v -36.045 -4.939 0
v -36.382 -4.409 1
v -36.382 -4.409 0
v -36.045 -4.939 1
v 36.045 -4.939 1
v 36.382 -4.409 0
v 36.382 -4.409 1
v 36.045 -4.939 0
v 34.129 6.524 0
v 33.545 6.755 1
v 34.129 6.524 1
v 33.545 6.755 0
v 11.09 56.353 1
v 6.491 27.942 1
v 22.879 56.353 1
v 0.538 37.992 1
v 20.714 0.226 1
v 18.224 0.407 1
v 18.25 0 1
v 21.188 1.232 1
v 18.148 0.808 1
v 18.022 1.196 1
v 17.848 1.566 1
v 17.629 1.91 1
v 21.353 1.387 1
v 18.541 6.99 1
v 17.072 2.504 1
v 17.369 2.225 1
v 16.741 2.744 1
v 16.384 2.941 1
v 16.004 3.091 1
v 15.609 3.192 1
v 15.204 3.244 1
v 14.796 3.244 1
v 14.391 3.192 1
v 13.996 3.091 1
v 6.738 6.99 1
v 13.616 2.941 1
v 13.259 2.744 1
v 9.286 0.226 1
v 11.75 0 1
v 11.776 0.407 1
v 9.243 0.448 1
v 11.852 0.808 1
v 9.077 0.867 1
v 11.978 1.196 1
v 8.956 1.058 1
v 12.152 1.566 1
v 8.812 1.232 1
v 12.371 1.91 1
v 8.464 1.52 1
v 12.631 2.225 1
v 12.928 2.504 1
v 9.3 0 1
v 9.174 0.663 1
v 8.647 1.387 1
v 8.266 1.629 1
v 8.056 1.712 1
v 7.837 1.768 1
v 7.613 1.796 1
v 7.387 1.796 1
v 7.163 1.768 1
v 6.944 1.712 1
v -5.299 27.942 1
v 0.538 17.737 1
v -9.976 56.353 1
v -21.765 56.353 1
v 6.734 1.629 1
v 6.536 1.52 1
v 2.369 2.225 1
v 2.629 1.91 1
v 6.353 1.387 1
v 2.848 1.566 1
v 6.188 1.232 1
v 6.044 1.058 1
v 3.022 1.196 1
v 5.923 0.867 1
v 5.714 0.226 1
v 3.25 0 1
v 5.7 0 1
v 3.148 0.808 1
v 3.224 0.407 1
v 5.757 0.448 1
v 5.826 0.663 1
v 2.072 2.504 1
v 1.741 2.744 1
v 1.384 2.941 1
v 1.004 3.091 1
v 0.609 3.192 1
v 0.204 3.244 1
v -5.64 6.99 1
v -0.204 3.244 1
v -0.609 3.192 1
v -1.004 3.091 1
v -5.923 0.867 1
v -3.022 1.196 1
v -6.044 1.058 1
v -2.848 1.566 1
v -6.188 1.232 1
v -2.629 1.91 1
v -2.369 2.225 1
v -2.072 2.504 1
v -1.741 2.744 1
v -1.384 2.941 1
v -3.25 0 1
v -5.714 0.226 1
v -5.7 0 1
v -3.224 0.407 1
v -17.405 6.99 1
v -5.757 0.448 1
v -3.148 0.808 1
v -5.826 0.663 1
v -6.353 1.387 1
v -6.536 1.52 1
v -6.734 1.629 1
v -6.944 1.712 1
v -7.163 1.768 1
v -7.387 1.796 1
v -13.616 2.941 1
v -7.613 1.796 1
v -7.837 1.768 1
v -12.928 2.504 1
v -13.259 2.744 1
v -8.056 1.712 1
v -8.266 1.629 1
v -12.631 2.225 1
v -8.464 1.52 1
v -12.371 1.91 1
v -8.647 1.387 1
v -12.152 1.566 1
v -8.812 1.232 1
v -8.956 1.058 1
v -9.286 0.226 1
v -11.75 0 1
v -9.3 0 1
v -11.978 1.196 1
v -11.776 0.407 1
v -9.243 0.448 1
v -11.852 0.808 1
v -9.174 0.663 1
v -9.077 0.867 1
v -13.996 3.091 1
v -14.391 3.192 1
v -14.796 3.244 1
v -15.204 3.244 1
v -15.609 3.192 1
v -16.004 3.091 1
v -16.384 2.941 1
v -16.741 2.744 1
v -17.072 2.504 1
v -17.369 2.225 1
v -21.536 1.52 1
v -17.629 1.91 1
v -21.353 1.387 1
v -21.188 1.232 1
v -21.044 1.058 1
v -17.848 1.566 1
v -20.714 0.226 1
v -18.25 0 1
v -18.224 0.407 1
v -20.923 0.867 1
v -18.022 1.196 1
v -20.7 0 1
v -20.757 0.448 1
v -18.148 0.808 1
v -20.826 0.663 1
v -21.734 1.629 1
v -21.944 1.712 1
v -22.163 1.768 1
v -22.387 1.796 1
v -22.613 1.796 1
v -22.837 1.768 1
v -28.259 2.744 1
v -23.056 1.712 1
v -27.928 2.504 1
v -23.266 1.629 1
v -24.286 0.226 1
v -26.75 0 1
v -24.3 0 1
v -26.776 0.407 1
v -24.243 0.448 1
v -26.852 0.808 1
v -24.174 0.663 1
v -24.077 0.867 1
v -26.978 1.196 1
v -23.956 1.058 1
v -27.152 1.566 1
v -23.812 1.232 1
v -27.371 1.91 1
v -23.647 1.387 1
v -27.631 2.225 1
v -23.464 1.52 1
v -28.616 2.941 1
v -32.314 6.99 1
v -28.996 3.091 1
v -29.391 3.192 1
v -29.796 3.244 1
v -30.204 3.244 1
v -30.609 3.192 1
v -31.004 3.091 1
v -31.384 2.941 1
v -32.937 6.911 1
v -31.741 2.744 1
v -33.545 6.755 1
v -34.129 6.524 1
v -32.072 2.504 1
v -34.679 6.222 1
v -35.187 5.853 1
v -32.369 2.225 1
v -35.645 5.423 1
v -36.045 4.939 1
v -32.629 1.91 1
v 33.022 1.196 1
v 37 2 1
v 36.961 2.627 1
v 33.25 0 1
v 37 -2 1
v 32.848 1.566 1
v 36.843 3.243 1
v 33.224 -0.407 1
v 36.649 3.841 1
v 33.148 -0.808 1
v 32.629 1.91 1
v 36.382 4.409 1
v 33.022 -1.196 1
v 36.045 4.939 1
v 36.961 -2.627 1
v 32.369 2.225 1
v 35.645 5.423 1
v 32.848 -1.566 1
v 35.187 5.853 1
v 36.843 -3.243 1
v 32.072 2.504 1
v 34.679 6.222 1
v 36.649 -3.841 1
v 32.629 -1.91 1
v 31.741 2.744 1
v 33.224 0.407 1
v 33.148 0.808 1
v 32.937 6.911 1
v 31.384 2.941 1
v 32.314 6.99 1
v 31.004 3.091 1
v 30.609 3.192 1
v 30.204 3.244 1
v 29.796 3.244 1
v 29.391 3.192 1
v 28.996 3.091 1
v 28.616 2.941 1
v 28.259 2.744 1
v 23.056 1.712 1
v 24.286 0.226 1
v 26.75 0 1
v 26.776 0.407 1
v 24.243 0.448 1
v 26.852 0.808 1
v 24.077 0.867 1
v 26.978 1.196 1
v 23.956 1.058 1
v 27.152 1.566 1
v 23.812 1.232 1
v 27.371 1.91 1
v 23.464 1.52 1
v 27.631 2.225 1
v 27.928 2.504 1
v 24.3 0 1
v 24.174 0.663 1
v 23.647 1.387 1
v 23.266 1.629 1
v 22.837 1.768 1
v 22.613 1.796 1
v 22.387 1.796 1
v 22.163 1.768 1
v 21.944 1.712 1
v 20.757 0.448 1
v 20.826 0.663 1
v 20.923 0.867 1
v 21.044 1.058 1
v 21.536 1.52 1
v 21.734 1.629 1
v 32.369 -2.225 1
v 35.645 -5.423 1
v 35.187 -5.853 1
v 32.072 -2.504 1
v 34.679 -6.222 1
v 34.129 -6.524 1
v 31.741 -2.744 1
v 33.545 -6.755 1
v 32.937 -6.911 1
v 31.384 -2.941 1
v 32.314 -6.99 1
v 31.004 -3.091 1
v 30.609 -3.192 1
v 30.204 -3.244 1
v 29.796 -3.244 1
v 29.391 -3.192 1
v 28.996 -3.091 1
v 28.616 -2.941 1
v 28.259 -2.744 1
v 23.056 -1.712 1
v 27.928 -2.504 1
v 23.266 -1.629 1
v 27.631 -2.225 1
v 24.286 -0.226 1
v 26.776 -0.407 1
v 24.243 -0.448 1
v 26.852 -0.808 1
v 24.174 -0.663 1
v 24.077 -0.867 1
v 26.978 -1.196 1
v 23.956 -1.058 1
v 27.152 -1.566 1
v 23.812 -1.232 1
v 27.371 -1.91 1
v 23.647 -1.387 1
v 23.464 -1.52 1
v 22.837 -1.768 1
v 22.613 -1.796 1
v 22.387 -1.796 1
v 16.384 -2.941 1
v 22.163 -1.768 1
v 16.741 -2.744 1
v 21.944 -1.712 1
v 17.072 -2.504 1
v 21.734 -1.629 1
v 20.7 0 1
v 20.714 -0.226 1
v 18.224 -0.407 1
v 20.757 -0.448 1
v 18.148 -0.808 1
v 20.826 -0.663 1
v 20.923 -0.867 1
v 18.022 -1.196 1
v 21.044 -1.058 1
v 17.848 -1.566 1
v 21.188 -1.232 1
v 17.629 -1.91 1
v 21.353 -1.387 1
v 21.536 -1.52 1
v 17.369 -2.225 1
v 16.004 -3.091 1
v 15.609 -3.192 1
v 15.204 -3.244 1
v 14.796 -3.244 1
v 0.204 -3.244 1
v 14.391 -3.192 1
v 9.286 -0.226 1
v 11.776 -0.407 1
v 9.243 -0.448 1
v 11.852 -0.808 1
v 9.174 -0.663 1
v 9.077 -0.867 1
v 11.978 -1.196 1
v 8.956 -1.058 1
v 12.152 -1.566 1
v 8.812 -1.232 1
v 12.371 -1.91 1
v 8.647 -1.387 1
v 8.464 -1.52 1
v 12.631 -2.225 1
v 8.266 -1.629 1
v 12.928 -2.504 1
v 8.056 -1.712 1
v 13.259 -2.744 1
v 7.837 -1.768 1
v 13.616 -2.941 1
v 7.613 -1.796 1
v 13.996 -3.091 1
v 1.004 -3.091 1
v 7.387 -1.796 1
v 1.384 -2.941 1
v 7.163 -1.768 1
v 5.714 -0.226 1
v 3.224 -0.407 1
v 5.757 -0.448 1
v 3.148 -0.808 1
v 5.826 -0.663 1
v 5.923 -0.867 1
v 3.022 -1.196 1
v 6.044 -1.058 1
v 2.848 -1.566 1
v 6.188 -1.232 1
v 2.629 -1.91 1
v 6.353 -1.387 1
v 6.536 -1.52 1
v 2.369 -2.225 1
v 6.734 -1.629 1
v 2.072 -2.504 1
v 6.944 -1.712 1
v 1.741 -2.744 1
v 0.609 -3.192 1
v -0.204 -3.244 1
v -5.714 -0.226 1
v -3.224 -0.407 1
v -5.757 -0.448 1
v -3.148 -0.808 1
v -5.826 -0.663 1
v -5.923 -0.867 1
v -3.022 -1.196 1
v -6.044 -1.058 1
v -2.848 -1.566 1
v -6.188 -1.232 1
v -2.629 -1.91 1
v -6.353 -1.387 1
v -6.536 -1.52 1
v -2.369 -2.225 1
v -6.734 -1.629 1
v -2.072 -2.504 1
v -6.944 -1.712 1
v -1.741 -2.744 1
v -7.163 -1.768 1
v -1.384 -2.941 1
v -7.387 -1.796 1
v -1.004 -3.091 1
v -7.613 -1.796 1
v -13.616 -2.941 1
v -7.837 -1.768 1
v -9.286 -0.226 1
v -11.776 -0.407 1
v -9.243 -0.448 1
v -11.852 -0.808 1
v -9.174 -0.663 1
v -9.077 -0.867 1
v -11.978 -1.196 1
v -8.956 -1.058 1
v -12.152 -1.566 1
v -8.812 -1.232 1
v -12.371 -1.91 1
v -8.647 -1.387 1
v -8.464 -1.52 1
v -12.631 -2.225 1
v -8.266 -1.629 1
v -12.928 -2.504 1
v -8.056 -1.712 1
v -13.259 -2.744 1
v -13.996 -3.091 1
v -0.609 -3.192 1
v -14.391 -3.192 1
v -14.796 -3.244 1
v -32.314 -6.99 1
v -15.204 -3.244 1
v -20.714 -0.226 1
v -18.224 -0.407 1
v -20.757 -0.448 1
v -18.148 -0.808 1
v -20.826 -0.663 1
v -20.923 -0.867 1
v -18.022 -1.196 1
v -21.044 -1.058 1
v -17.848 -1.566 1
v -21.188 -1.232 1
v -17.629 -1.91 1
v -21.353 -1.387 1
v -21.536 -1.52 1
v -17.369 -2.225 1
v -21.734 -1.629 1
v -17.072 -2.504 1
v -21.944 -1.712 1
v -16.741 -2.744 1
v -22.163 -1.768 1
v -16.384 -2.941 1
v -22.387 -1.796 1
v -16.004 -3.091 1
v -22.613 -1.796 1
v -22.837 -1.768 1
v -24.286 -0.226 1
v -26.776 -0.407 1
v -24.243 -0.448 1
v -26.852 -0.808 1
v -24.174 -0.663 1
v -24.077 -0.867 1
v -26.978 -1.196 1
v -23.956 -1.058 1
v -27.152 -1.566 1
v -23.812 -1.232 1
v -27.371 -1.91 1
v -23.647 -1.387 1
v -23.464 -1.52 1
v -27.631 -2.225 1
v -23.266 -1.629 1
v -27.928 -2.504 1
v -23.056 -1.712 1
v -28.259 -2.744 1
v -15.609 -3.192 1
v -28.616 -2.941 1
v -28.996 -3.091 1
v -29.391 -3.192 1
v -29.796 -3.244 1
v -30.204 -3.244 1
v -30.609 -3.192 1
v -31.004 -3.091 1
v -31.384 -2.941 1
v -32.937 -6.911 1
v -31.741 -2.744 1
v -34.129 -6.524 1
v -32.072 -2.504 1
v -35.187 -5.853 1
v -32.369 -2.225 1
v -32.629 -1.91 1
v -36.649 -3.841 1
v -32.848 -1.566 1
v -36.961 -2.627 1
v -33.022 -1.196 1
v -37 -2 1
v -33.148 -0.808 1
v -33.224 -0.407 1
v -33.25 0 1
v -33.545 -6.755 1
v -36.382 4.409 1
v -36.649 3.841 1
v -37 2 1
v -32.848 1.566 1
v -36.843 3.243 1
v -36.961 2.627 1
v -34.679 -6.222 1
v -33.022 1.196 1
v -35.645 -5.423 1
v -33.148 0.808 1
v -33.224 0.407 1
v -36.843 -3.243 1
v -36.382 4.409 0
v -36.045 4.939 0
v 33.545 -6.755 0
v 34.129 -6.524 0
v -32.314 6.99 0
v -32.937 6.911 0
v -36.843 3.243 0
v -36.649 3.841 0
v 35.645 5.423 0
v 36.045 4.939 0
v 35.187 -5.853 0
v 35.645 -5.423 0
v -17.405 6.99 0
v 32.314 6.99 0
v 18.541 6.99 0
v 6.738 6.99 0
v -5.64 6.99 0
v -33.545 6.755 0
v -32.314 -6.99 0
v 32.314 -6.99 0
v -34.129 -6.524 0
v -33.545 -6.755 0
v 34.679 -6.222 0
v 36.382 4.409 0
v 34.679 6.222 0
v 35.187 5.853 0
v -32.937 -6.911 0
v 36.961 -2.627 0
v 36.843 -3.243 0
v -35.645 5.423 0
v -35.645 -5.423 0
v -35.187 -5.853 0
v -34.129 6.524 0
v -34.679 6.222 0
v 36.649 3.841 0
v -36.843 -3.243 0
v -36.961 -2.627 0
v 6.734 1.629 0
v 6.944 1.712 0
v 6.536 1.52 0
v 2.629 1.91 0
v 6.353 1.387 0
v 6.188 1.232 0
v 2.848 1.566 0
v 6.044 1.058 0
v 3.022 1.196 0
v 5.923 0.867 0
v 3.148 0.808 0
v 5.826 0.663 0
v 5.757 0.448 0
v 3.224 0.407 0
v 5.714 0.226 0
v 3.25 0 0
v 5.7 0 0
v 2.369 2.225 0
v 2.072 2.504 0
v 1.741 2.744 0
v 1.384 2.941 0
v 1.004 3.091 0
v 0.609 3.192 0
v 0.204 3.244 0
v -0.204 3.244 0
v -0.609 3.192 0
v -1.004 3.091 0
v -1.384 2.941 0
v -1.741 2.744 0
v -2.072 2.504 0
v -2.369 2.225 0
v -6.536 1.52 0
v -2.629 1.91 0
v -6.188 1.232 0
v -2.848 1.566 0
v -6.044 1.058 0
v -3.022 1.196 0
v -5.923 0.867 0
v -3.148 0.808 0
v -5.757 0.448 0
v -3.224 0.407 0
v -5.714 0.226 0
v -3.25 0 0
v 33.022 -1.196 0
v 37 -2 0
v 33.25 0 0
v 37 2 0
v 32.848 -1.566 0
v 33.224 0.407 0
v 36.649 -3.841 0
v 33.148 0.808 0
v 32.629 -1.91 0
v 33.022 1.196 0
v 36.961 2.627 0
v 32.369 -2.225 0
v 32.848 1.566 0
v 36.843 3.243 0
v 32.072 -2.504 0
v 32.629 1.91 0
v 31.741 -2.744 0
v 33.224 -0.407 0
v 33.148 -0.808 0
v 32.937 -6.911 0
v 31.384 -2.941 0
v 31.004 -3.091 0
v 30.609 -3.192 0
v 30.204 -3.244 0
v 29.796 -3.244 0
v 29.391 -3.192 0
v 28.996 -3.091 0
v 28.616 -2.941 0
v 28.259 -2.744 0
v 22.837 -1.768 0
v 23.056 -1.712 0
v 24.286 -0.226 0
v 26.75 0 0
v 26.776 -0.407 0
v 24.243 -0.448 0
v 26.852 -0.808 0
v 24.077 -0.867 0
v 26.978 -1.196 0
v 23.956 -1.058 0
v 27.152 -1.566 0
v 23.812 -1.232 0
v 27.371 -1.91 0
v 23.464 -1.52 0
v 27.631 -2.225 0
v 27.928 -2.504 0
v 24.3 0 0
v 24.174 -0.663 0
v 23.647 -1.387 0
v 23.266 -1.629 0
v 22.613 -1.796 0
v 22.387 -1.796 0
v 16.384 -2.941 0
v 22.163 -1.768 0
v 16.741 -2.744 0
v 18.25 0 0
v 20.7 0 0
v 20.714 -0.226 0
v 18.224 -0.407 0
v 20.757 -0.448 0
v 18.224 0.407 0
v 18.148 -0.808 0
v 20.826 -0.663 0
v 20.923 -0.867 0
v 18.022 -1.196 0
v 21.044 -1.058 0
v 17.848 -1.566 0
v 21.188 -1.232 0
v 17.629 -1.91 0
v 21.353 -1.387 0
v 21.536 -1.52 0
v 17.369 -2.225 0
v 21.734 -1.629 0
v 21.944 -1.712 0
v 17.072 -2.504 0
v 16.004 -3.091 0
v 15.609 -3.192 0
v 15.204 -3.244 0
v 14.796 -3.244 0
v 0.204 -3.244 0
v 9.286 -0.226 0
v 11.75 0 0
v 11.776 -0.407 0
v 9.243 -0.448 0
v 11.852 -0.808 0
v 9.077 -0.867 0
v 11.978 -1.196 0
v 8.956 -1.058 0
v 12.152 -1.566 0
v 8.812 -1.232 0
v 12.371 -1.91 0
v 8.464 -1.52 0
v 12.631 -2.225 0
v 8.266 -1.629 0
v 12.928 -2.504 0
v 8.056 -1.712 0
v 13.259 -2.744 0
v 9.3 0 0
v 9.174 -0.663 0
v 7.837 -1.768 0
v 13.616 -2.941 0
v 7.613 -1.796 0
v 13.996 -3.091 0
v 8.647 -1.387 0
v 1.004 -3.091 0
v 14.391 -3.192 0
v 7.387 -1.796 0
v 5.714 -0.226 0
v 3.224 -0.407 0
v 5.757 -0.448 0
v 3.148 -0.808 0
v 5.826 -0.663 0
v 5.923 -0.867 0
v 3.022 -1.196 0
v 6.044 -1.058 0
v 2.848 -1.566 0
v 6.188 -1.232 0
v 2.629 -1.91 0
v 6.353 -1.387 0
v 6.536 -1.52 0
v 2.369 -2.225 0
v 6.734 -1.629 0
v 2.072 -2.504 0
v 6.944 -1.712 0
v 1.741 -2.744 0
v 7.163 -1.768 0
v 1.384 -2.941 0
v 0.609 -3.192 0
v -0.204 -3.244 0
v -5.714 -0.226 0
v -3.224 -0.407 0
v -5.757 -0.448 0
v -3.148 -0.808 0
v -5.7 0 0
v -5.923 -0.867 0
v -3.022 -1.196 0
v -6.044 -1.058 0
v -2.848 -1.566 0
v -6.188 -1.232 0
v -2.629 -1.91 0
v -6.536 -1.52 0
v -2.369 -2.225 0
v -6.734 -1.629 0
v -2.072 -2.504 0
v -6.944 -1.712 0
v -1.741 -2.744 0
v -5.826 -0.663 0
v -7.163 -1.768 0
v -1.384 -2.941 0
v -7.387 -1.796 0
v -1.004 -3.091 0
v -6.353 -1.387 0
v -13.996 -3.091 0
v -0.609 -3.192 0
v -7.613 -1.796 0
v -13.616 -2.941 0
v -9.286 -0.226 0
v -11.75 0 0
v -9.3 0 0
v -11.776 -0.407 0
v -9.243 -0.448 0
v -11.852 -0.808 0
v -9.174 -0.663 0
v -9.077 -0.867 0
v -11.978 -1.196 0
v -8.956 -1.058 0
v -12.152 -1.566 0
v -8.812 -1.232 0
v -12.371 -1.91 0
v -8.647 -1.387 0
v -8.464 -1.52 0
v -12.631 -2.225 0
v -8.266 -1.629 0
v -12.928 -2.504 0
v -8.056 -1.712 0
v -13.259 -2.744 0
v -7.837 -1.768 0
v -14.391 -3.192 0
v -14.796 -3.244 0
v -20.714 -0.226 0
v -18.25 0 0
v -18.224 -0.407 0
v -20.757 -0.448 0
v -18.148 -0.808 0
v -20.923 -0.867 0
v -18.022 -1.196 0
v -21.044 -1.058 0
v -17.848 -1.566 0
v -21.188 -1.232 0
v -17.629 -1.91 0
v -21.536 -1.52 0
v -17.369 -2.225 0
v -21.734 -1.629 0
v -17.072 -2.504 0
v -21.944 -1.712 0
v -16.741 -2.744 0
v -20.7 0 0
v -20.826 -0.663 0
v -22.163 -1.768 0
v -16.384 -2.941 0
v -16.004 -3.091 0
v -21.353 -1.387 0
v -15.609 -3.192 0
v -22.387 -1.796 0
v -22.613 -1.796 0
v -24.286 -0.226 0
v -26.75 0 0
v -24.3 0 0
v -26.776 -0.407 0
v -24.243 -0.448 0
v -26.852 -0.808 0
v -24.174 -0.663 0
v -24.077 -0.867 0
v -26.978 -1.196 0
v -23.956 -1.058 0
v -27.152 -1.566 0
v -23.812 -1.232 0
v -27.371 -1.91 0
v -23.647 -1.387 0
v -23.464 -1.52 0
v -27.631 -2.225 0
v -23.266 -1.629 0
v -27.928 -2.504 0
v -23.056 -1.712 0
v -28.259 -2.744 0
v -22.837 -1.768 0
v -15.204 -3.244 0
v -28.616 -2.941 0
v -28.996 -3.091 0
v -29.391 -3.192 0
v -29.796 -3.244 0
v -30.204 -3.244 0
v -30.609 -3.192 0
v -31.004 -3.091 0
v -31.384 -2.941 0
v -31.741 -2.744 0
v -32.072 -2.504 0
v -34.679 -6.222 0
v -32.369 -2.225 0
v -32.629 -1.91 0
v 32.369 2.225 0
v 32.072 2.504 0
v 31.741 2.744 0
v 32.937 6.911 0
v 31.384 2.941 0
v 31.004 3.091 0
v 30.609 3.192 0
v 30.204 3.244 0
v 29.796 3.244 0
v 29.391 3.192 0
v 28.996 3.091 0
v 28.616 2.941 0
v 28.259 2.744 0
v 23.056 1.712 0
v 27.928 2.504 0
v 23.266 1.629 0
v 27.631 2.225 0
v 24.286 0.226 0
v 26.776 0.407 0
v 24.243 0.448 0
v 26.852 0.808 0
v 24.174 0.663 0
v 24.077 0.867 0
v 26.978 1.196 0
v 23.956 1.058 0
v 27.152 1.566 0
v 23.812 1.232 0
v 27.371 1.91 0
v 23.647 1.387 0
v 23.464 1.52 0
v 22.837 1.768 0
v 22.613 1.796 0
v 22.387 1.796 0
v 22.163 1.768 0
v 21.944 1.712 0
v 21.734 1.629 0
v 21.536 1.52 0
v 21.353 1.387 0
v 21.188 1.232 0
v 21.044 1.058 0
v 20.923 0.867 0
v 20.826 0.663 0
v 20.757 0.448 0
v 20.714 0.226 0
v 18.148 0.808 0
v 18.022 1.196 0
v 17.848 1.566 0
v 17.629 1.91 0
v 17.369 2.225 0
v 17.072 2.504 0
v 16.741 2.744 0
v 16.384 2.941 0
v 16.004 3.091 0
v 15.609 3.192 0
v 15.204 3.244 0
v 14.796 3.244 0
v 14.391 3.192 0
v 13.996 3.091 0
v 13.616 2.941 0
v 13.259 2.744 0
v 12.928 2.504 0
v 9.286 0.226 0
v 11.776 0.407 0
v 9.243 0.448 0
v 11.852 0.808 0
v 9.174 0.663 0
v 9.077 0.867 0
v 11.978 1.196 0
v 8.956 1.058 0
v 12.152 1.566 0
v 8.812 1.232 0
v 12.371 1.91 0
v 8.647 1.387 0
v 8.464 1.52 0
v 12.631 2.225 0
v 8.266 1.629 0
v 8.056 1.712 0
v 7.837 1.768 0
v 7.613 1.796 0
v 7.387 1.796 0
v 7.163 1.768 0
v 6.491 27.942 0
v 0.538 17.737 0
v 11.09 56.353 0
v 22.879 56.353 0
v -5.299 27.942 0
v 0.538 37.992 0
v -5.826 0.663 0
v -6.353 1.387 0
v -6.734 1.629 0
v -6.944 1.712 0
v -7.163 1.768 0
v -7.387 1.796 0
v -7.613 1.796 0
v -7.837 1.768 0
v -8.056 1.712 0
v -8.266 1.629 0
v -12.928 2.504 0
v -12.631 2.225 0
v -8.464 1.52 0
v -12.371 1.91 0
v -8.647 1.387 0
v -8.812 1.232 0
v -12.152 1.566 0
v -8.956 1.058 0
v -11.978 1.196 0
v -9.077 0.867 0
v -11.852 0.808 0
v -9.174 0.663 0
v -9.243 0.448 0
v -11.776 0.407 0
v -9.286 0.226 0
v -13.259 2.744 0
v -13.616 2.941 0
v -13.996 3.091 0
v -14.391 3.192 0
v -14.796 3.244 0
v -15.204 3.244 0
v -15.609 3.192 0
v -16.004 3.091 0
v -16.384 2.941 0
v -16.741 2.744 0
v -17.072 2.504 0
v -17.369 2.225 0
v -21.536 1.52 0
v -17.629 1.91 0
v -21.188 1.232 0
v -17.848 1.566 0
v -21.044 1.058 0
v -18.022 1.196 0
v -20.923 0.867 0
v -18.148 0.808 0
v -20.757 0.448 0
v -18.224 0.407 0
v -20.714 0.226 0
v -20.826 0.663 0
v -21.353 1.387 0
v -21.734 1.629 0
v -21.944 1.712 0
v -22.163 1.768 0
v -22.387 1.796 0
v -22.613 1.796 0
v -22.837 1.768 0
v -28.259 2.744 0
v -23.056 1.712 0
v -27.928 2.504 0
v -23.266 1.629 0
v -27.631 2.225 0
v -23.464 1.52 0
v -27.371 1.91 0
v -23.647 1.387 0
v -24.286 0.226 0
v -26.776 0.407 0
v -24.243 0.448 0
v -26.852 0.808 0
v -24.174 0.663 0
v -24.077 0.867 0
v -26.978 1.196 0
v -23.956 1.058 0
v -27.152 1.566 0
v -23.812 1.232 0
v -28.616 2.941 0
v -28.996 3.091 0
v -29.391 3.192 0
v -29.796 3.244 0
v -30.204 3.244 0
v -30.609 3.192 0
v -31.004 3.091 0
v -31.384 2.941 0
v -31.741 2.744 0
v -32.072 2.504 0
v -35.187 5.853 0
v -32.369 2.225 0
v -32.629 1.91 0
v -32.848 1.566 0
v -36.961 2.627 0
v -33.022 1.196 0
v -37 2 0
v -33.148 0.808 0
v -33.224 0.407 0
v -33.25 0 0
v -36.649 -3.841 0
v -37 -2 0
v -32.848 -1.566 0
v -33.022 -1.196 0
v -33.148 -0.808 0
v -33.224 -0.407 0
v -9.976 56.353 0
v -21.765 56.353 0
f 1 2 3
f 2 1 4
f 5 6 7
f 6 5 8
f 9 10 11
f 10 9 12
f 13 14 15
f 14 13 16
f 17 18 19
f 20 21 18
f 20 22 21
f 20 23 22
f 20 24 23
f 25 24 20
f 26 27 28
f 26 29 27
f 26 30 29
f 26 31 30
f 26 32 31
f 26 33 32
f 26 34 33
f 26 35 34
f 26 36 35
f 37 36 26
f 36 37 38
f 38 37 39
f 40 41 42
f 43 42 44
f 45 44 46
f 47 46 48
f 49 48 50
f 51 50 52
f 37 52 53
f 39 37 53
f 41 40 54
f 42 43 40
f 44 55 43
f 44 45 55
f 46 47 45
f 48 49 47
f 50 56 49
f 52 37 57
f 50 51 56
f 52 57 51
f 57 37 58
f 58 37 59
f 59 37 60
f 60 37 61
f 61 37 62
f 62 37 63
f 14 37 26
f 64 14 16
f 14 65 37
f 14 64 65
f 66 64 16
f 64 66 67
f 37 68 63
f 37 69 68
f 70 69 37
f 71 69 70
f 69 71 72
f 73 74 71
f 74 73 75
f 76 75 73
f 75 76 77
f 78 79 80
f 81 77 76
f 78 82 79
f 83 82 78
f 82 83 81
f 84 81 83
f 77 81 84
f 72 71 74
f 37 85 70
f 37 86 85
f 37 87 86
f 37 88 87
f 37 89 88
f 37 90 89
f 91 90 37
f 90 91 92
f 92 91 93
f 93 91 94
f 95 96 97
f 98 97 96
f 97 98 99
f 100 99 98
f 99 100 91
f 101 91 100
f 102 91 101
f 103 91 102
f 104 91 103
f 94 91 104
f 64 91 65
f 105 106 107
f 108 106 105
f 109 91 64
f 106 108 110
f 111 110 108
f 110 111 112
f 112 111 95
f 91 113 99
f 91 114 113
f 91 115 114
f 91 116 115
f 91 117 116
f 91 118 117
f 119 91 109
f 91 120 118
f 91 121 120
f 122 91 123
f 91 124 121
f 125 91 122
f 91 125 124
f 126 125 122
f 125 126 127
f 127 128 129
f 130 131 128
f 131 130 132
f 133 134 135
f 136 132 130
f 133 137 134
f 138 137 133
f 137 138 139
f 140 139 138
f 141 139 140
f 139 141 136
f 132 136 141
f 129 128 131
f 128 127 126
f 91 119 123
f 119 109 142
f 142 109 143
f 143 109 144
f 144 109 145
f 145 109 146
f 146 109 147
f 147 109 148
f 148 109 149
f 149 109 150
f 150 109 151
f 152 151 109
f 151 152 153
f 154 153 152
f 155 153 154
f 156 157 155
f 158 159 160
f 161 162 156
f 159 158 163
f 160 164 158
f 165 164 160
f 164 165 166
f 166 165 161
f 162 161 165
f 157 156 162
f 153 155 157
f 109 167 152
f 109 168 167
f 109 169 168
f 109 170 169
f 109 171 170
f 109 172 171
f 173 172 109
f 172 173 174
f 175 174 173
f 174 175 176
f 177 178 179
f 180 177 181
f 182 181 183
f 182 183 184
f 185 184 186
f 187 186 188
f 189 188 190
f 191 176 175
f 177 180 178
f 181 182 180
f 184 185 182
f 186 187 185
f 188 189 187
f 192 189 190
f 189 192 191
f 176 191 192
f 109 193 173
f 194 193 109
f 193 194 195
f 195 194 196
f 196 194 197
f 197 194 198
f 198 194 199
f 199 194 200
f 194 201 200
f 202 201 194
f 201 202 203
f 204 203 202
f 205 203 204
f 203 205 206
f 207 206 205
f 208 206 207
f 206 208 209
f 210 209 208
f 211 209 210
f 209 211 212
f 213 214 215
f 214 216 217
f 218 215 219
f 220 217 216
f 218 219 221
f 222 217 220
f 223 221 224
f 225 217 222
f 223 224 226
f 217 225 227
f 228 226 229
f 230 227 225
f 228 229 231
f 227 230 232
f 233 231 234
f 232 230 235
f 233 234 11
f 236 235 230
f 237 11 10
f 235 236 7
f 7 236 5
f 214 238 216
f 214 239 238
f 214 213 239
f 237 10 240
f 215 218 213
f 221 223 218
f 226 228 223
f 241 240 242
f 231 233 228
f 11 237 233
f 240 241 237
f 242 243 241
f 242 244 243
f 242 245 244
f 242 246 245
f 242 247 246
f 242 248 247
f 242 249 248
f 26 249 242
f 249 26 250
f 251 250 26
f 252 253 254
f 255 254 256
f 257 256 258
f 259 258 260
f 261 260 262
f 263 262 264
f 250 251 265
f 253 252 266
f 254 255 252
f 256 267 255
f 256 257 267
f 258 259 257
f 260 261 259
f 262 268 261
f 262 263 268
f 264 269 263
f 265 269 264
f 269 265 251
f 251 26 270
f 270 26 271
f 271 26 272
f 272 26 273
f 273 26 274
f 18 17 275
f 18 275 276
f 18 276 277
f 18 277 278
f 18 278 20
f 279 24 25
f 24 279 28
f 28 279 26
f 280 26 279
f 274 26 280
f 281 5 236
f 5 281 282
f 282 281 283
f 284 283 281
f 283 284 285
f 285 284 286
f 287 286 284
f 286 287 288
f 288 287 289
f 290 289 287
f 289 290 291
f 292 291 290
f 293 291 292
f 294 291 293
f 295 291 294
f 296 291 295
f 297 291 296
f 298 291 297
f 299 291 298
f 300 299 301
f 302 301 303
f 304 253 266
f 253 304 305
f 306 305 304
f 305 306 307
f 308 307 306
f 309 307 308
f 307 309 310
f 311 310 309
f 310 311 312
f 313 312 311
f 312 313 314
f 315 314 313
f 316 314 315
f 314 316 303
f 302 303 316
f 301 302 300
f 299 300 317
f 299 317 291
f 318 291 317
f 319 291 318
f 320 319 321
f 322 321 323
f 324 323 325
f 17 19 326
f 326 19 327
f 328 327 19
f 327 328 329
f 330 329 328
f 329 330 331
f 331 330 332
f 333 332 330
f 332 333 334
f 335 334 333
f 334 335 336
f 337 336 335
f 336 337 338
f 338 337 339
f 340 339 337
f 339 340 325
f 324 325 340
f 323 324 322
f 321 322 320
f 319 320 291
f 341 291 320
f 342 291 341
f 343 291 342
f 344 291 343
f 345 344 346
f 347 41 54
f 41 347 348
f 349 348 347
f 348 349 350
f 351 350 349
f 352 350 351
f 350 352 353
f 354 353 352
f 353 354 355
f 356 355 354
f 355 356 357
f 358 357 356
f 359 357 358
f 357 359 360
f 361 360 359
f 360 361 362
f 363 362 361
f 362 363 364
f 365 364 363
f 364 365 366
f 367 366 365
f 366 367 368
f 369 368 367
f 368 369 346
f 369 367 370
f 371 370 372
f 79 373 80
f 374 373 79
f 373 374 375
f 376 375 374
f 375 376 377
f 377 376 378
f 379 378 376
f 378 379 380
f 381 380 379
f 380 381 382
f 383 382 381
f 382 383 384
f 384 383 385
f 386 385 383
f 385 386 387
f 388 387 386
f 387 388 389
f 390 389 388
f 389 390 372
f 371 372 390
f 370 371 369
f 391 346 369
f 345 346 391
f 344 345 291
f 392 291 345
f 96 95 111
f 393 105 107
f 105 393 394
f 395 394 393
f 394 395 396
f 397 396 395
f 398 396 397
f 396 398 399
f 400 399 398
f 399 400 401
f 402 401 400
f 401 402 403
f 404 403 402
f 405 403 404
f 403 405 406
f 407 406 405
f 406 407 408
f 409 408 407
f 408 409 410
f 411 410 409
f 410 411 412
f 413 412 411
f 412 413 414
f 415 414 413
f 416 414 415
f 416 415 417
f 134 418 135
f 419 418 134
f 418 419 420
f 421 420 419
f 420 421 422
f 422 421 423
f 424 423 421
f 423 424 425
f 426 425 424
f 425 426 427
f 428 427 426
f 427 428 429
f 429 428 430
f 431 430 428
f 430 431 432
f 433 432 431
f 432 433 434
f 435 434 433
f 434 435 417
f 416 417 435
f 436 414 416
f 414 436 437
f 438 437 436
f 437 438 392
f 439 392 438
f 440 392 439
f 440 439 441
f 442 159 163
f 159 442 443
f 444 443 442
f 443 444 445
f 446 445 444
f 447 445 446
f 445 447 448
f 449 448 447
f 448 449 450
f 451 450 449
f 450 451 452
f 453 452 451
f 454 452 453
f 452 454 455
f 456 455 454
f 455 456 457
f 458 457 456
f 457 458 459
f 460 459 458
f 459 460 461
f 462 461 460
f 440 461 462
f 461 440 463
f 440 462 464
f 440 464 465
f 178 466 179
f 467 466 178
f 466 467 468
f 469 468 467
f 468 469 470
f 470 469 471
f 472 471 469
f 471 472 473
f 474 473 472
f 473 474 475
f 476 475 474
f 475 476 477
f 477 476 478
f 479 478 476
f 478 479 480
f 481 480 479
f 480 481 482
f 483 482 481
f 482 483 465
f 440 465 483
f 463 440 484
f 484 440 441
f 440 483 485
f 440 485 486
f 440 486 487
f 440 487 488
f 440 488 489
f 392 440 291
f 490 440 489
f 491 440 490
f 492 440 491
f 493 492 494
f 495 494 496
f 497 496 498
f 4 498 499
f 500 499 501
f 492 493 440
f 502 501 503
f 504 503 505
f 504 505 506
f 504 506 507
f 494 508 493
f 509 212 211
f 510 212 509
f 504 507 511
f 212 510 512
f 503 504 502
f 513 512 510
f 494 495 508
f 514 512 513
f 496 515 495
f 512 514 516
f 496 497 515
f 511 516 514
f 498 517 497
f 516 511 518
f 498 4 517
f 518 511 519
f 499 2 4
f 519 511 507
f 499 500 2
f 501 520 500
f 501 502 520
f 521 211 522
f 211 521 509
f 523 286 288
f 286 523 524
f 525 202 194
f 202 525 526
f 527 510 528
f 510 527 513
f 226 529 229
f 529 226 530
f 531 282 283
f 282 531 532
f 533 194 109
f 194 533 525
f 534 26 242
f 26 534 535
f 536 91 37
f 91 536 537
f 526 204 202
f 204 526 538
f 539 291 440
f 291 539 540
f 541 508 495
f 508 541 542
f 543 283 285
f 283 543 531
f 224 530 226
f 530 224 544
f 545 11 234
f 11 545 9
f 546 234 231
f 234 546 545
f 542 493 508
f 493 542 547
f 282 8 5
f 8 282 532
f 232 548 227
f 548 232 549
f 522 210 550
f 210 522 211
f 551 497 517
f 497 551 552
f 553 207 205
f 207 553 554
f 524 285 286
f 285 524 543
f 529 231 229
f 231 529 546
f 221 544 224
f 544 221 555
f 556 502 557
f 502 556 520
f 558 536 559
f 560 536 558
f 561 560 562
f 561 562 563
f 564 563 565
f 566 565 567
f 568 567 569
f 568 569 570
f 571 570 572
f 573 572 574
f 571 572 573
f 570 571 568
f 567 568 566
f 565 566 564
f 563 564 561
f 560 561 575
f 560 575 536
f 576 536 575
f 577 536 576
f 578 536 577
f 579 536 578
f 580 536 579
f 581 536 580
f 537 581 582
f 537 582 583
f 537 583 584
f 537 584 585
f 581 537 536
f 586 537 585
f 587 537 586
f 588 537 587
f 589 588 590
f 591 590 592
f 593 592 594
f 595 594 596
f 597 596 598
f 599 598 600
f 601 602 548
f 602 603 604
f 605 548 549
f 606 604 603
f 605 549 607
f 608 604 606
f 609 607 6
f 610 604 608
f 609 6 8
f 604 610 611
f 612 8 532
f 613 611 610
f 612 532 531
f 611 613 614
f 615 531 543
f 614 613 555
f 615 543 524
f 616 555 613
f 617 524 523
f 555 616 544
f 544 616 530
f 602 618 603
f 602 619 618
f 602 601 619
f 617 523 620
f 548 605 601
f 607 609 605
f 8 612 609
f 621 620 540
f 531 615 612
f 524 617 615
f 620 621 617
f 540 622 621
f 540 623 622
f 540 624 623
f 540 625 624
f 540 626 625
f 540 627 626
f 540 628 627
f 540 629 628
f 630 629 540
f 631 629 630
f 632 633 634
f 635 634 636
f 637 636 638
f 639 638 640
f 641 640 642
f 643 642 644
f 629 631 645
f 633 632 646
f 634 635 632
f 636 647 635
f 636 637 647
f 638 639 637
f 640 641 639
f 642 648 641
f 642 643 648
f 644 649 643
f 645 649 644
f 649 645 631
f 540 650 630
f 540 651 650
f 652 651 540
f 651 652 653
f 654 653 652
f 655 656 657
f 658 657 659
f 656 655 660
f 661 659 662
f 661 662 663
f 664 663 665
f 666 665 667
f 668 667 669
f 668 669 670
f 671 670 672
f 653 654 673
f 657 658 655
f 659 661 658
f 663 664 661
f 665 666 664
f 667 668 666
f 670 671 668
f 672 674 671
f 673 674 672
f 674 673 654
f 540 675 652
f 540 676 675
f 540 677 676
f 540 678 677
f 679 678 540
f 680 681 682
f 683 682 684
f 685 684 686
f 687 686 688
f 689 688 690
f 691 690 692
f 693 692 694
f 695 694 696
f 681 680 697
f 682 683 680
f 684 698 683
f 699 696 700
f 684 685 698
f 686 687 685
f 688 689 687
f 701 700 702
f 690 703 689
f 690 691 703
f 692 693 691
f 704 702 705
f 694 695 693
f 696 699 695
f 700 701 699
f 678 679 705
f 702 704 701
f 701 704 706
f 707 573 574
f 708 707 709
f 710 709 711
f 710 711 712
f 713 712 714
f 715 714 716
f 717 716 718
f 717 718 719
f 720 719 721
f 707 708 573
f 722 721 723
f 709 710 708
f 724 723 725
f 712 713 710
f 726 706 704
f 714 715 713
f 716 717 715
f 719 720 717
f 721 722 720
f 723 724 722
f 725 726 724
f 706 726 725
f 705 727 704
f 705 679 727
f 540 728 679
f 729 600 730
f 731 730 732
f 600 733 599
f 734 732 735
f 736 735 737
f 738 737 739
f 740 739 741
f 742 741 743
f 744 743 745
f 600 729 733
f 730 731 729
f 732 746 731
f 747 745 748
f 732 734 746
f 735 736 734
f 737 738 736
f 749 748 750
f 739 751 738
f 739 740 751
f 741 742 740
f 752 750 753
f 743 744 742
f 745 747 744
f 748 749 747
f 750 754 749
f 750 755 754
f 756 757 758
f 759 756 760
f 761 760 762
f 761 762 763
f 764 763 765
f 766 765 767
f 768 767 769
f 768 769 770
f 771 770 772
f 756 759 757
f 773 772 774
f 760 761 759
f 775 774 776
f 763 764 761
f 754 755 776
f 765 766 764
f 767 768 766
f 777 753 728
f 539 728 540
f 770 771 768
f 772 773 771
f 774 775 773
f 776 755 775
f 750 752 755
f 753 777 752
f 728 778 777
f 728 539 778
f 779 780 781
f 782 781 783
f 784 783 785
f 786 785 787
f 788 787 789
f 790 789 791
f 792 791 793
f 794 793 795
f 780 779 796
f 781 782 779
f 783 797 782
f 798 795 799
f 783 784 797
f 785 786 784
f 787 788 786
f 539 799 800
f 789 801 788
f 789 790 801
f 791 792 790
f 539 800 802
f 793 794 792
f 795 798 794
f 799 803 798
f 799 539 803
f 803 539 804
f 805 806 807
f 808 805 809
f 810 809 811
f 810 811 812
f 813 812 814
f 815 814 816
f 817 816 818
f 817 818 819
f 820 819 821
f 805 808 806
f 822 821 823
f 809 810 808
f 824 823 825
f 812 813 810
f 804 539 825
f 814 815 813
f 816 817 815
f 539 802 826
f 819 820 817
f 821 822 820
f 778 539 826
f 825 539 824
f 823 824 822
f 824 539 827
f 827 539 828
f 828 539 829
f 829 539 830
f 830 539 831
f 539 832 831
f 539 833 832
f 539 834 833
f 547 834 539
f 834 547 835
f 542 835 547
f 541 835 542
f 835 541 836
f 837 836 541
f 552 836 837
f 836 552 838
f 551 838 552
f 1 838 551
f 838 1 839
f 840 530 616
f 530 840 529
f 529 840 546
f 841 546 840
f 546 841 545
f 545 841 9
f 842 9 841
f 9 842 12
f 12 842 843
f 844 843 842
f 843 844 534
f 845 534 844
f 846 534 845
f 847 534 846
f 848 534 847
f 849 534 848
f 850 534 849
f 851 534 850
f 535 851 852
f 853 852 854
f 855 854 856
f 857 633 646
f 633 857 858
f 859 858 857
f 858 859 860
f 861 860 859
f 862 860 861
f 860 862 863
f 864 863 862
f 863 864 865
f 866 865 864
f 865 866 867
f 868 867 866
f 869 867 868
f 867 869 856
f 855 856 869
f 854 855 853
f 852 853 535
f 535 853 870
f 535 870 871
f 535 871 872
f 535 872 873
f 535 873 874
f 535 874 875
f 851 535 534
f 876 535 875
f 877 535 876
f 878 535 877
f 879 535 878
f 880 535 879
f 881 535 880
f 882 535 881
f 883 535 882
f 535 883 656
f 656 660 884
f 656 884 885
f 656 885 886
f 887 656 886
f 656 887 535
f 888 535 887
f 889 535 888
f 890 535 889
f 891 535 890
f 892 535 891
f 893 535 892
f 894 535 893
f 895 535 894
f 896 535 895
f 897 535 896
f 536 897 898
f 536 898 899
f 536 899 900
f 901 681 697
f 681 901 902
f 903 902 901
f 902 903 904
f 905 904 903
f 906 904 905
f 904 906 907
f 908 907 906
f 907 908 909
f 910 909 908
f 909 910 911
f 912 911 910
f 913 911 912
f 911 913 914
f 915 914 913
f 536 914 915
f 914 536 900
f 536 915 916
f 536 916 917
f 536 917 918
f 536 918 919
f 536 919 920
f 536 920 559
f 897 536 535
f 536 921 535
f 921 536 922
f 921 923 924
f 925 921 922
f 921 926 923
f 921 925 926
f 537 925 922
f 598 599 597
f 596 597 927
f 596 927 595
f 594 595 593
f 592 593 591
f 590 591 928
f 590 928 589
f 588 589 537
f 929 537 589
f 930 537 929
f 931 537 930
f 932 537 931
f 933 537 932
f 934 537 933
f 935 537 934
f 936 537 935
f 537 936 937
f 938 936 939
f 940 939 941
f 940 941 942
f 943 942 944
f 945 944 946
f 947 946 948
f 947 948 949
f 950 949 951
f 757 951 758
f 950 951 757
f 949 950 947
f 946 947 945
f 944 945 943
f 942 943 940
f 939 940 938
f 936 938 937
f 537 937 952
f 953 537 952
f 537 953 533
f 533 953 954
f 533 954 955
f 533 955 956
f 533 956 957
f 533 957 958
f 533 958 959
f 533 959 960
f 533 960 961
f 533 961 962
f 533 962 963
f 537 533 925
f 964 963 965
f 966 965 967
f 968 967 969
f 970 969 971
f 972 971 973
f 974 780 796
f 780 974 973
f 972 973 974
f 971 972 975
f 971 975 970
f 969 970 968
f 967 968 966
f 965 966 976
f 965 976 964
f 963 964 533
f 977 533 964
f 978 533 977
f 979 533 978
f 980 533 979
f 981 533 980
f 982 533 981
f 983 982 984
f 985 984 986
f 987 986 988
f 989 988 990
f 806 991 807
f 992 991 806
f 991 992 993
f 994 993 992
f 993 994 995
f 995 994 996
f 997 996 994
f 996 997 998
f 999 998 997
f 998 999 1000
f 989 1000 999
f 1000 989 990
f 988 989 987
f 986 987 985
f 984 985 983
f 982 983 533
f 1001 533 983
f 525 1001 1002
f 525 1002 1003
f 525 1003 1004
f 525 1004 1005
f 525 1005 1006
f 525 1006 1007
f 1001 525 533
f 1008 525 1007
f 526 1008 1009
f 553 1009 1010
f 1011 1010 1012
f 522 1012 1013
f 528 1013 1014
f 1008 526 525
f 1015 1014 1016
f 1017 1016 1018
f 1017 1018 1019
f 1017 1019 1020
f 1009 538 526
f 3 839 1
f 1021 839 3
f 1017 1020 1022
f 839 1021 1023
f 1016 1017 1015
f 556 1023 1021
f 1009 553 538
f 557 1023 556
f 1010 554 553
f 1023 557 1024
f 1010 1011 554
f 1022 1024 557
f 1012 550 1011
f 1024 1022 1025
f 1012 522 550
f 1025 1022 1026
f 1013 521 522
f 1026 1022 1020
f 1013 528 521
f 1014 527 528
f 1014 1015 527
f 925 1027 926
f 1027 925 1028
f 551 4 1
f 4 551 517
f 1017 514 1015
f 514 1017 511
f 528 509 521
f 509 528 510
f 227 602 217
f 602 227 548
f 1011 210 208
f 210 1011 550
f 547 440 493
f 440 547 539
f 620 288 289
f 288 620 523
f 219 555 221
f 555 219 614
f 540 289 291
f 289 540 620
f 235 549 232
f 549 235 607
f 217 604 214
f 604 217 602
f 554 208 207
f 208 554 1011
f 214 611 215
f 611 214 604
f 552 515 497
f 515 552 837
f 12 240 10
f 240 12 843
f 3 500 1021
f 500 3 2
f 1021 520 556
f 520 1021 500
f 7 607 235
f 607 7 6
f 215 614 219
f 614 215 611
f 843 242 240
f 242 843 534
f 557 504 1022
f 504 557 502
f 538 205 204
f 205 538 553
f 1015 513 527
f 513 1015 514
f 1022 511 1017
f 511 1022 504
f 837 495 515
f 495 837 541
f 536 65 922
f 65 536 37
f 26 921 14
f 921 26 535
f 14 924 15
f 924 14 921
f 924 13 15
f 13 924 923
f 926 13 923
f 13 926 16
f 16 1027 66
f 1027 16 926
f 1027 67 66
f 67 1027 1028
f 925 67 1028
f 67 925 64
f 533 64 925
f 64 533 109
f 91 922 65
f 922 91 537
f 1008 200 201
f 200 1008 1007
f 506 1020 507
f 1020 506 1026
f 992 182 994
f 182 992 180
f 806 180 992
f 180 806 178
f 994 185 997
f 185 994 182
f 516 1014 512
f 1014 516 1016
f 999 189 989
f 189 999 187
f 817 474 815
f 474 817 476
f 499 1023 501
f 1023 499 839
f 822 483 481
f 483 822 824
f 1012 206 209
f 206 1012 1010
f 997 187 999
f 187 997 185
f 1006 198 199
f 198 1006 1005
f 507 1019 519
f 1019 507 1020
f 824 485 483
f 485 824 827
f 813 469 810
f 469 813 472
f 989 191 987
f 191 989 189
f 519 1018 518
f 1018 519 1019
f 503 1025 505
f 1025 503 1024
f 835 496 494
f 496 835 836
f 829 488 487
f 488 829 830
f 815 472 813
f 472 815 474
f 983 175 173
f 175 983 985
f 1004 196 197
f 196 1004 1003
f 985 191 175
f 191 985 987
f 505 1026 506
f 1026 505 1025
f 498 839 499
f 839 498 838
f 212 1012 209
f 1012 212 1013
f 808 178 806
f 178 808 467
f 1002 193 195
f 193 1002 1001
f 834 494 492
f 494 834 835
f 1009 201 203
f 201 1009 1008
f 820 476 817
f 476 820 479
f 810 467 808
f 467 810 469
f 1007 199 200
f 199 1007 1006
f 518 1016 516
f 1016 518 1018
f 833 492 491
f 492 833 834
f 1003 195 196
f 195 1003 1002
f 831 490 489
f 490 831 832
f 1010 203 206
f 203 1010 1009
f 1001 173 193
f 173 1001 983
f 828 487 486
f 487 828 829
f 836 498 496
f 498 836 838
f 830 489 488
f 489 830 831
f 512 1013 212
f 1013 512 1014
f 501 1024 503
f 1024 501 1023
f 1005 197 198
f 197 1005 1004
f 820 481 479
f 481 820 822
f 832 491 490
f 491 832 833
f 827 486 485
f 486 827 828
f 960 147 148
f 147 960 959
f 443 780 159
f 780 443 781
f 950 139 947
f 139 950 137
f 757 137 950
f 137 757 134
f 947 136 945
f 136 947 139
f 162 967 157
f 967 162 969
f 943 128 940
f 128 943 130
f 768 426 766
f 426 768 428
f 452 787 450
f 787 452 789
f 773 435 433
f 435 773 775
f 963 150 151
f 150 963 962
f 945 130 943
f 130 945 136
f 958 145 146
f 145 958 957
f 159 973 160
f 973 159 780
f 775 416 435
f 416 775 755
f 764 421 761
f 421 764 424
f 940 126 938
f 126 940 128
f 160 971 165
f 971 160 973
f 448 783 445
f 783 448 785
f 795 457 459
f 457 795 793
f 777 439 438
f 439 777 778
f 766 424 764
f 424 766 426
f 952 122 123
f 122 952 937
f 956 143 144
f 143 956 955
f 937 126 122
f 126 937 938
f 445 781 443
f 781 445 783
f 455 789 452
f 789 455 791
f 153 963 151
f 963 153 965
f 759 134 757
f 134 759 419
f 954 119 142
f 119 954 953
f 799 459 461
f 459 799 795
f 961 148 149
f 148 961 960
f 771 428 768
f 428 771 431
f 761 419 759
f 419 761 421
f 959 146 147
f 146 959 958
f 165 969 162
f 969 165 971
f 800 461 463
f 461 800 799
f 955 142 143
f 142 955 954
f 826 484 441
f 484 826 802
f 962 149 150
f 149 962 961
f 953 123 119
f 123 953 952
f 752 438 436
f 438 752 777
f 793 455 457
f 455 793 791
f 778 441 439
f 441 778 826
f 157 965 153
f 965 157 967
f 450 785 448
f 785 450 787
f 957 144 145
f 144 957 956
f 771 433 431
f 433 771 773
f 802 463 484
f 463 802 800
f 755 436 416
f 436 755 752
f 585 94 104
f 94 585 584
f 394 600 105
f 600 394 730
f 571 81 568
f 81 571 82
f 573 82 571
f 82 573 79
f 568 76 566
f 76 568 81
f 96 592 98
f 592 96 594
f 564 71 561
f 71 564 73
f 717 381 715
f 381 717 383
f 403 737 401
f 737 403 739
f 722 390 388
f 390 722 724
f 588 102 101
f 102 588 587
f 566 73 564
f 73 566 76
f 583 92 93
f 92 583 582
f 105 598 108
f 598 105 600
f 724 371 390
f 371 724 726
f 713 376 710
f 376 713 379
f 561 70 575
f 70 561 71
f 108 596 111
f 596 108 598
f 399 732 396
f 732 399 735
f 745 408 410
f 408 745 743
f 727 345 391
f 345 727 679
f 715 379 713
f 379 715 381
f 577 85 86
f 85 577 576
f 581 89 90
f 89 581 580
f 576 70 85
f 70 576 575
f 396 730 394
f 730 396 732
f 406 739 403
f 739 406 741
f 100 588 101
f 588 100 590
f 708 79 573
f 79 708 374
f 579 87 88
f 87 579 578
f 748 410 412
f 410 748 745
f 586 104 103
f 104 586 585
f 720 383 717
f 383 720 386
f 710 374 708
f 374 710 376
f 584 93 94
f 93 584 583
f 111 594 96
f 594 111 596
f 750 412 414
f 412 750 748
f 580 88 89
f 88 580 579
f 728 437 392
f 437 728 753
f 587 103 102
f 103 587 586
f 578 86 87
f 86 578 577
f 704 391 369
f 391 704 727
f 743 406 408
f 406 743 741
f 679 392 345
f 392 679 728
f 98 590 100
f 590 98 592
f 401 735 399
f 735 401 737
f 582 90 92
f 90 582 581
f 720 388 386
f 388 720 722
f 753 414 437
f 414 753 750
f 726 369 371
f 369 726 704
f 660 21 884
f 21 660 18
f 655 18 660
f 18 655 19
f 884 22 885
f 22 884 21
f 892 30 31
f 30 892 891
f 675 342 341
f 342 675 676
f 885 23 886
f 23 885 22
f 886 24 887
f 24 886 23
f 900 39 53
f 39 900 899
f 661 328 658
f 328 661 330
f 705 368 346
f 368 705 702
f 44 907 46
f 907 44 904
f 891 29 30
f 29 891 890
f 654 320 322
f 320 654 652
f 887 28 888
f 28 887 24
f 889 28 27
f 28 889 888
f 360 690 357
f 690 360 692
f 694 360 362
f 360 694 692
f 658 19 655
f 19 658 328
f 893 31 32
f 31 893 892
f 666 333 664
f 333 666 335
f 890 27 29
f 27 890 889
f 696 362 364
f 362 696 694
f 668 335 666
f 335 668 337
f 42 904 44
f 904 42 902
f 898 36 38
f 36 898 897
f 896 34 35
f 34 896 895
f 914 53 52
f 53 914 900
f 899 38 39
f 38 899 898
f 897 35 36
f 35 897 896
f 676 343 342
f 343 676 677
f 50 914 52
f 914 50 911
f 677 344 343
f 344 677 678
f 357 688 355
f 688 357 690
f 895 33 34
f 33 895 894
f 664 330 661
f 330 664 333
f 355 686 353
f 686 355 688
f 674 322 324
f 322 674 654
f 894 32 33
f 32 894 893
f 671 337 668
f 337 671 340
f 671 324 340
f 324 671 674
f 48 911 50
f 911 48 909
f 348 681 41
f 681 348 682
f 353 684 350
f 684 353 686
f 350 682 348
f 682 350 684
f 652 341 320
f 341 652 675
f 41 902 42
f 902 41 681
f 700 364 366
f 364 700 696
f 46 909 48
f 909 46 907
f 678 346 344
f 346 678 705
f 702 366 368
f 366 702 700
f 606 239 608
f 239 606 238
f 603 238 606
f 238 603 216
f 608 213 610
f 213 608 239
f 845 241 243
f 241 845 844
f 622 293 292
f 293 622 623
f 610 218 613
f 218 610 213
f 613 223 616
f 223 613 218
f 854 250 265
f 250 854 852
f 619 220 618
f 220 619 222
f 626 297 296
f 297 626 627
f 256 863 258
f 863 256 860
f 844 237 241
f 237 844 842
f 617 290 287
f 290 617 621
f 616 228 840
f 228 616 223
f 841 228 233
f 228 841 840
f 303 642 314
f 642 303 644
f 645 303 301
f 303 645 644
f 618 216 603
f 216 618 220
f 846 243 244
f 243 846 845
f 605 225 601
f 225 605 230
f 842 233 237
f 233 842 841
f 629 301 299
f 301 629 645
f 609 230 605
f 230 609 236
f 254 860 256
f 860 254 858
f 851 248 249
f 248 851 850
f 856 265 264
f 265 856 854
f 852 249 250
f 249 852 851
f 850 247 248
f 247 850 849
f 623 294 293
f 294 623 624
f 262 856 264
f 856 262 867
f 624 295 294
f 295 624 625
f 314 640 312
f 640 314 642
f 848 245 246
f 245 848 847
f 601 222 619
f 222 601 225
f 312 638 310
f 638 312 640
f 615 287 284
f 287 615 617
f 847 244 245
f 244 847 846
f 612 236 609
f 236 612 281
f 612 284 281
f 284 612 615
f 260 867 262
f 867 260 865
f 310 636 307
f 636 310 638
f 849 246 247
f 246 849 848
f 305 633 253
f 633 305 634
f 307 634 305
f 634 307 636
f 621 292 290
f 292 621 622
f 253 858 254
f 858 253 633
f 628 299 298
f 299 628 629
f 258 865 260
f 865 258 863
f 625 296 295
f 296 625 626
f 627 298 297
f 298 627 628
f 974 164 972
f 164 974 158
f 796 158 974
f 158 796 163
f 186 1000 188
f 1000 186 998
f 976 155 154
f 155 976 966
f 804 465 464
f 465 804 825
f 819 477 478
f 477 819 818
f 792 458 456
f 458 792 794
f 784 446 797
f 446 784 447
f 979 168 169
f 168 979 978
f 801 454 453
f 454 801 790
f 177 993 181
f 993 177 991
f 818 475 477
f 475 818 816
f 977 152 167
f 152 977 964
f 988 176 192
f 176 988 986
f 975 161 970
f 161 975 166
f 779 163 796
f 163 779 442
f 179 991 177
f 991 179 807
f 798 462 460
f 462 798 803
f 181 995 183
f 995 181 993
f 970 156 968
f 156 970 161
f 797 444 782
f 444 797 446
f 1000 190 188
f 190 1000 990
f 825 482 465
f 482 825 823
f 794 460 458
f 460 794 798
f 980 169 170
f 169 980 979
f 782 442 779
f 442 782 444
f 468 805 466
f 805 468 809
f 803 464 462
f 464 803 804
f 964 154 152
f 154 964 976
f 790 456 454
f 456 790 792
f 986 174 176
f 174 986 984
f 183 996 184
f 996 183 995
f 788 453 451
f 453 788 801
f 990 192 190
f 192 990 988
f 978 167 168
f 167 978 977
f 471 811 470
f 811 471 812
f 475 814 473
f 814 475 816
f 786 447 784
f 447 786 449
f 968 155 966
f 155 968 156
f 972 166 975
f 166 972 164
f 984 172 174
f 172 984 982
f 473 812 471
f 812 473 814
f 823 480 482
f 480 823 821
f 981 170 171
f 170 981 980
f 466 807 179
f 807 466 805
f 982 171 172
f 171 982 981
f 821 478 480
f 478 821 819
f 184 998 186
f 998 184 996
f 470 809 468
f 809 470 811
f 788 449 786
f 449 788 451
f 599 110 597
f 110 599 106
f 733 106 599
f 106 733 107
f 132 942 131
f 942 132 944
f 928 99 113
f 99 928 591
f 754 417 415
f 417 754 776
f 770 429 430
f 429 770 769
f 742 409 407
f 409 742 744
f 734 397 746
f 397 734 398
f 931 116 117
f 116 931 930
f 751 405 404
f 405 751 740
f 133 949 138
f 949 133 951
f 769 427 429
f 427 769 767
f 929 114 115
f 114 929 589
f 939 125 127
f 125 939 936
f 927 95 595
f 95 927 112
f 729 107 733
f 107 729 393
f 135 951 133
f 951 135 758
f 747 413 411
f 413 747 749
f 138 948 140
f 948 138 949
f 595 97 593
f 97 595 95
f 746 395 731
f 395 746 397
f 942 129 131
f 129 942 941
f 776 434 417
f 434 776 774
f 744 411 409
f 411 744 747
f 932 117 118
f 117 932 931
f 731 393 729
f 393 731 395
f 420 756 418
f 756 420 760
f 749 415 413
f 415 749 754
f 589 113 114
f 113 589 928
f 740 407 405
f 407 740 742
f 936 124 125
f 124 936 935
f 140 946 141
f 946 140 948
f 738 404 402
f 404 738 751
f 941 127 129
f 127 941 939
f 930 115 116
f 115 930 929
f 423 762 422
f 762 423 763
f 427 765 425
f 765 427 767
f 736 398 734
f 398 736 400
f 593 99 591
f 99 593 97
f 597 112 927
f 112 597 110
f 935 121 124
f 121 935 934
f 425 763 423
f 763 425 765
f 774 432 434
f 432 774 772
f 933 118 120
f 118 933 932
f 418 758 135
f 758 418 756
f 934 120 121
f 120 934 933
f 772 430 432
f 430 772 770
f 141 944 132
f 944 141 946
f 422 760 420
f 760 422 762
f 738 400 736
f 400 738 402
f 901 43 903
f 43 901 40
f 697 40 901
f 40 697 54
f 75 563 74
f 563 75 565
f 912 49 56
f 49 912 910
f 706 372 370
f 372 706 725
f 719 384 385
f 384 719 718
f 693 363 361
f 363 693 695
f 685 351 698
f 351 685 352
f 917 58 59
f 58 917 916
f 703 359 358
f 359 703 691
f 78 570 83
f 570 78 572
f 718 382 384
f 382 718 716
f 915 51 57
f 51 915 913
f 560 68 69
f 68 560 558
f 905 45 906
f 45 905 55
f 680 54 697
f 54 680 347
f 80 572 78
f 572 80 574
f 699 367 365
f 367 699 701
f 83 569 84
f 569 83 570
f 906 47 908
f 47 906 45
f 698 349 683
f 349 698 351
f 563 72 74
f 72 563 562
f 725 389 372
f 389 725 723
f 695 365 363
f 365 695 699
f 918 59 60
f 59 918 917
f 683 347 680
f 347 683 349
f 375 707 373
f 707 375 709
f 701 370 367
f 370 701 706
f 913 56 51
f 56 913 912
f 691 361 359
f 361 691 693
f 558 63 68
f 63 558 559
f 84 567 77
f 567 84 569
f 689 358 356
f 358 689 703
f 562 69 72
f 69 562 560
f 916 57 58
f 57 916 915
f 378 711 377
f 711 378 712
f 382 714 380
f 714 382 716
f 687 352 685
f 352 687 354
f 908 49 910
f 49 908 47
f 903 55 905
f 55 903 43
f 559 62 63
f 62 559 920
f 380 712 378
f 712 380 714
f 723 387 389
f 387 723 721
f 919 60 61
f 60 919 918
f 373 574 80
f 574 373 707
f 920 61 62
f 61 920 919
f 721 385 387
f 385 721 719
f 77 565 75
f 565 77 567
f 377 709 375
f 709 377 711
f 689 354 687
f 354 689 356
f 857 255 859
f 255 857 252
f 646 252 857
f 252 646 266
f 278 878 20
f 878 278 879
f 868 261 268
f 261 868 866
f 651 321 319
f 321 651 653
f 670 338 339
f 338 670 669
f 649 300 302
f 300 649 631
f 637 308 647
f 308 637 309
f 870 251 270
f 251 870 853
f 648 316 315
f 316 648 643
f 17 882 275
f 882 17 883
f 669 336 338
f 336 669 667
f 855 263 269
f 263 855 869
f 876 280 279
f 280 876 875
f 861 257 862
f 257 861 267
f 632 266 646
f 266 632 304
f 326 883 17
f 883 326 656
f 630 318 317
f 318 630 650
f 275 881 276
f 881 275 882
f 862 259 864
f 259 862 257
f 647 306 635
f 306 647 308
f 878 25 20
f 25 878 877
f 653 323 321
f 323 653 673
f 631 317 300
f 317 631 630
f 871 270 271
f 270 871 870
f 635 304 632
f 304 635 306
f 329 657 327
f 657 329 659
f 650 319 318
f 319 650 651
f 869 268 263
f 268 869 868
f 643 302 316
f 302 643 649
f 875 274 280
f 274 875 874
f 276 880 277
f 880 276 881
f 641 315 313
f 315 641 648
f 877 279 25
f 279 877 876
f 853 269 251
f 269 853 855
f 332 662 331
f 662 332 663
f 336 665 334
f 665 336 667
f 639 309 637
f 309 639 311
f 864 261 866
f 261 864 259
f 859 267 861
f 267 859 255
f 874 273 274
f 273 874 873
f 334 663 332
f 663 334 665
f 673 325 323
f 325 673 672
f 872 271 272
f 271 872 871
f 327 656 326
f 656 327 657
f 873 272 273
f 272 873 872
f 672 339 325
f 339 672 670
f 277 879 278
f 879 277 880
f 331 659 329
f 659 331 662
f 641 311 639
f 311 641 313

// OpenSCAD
$fn = 50;


difference() {
	union() {
		hull() {
			translate(v = [-32.0000000000, 2.0000000000, 0]) {
				cylinder(h = 1, r = 5);
			}
			translate(v = [32.0000000000, 2.0000000000, 0]) {
				cylinder(h = 1, r = 5);
			}
			translate(v = [-32.0000000000, -2.0000000000, 0]) {
				cylinder(h = 1, r = 5);
			}
			translate(v = [32.0000000000, -2.0000000000, 0]) {
				cylinder(h = 1, r = 5);
			}
		}
		translate(v = [0, 55, 0]) {
			linear_extrude(height = 1) {
				text(font = "DejaVu Sans Mono:style=Bold", halign = "center", size = 57.0000000000, text = "X", valign = "top");
			}
		}
	}
	union() {
		translate(v = [-30.0000000000, 0.0000000000, 0]) {
			translate(v = [0, 0, -100]) {
				cylinder(h = 200, r = 3.2500000000);
			}
		}
		translate(v = [-15.0000000000, 0.0000000000, 0]) {
			translate(v = [0, 0, -100]) {
				cylinder(h = 200, r = 3.2500000000);
			}
		}
		translate(v = [0, 0, -100]) {
			cylinder(h = 200, r = 3.2500000000);
		}
		translate(v = [15.0000000000, 0.0000000000, 0]) {
			translate(v = [0, 0, -100]) {
				cylinder(h = 200, r = 3.2500000000);
			}
		}
		translate(v = [30.0000000000, 0.0000000000, 0]) {
			translate(v = [0, 0, -100]) {
				cylinder(h = 200, r = 3.2500000000);
			}
		}
		translate(v = [-30.0000000000, 0.0000000000, 0]) {
			translate(v = [0, 0, -100]) {
				cylinder(h = 200, r = 1.8000000000);
			}
		}
		translate(v = [-22.5000000000, 0.0000000000, 0]) {
			translate(v = [0, 0, -100]) {
				cylinder(h = 200, r = 1.8000000000);
			}
		}
		translate(v = [-15.0000000000, 0.0000000000, 0]) {
			translate(v = [0, 0, -100]) {
				cylinder(h = 200, r = 1.8000000000);
			}
		}
		translate(v = [-7.5000000000, 0.0000000000, 0]) {
			translate(v = [0, 0, -100]) {
				cylinder(h = 200, r = 1.8000000000);
			}
		}
		translate(v = [0, 0, -100]) {
			cylinder(h = 200, r = 1.8000000000);
		}
		translate(v = [7.5000000000, 0.0000000000, 0]) {
			translate(v = [0, 0, -100]) {
				cylinder(h = 200, r = 1.8000000000);
			}
		}
		translate(v = [15.0000000000, 0.0000000000, 0]) {
			translate(v = [0, 0, -100]) {
				cylinder(h = 200, r = 1.8000000000);
			}
		}
		translate(v = [22.5000000000, 0.0000000000, 0]) {
			translate(v = [0, 0, -100]) {
				cylinder(h = 200, r = 1.8000000000);
			}
		}
		translate(v = [30.0000000000, 0.0000000000, 0]) {
			translate(v = [0, 0, -100]) {
				cylinder(h = 200, r = 1.8000000000);
			}
		}
	}
}
